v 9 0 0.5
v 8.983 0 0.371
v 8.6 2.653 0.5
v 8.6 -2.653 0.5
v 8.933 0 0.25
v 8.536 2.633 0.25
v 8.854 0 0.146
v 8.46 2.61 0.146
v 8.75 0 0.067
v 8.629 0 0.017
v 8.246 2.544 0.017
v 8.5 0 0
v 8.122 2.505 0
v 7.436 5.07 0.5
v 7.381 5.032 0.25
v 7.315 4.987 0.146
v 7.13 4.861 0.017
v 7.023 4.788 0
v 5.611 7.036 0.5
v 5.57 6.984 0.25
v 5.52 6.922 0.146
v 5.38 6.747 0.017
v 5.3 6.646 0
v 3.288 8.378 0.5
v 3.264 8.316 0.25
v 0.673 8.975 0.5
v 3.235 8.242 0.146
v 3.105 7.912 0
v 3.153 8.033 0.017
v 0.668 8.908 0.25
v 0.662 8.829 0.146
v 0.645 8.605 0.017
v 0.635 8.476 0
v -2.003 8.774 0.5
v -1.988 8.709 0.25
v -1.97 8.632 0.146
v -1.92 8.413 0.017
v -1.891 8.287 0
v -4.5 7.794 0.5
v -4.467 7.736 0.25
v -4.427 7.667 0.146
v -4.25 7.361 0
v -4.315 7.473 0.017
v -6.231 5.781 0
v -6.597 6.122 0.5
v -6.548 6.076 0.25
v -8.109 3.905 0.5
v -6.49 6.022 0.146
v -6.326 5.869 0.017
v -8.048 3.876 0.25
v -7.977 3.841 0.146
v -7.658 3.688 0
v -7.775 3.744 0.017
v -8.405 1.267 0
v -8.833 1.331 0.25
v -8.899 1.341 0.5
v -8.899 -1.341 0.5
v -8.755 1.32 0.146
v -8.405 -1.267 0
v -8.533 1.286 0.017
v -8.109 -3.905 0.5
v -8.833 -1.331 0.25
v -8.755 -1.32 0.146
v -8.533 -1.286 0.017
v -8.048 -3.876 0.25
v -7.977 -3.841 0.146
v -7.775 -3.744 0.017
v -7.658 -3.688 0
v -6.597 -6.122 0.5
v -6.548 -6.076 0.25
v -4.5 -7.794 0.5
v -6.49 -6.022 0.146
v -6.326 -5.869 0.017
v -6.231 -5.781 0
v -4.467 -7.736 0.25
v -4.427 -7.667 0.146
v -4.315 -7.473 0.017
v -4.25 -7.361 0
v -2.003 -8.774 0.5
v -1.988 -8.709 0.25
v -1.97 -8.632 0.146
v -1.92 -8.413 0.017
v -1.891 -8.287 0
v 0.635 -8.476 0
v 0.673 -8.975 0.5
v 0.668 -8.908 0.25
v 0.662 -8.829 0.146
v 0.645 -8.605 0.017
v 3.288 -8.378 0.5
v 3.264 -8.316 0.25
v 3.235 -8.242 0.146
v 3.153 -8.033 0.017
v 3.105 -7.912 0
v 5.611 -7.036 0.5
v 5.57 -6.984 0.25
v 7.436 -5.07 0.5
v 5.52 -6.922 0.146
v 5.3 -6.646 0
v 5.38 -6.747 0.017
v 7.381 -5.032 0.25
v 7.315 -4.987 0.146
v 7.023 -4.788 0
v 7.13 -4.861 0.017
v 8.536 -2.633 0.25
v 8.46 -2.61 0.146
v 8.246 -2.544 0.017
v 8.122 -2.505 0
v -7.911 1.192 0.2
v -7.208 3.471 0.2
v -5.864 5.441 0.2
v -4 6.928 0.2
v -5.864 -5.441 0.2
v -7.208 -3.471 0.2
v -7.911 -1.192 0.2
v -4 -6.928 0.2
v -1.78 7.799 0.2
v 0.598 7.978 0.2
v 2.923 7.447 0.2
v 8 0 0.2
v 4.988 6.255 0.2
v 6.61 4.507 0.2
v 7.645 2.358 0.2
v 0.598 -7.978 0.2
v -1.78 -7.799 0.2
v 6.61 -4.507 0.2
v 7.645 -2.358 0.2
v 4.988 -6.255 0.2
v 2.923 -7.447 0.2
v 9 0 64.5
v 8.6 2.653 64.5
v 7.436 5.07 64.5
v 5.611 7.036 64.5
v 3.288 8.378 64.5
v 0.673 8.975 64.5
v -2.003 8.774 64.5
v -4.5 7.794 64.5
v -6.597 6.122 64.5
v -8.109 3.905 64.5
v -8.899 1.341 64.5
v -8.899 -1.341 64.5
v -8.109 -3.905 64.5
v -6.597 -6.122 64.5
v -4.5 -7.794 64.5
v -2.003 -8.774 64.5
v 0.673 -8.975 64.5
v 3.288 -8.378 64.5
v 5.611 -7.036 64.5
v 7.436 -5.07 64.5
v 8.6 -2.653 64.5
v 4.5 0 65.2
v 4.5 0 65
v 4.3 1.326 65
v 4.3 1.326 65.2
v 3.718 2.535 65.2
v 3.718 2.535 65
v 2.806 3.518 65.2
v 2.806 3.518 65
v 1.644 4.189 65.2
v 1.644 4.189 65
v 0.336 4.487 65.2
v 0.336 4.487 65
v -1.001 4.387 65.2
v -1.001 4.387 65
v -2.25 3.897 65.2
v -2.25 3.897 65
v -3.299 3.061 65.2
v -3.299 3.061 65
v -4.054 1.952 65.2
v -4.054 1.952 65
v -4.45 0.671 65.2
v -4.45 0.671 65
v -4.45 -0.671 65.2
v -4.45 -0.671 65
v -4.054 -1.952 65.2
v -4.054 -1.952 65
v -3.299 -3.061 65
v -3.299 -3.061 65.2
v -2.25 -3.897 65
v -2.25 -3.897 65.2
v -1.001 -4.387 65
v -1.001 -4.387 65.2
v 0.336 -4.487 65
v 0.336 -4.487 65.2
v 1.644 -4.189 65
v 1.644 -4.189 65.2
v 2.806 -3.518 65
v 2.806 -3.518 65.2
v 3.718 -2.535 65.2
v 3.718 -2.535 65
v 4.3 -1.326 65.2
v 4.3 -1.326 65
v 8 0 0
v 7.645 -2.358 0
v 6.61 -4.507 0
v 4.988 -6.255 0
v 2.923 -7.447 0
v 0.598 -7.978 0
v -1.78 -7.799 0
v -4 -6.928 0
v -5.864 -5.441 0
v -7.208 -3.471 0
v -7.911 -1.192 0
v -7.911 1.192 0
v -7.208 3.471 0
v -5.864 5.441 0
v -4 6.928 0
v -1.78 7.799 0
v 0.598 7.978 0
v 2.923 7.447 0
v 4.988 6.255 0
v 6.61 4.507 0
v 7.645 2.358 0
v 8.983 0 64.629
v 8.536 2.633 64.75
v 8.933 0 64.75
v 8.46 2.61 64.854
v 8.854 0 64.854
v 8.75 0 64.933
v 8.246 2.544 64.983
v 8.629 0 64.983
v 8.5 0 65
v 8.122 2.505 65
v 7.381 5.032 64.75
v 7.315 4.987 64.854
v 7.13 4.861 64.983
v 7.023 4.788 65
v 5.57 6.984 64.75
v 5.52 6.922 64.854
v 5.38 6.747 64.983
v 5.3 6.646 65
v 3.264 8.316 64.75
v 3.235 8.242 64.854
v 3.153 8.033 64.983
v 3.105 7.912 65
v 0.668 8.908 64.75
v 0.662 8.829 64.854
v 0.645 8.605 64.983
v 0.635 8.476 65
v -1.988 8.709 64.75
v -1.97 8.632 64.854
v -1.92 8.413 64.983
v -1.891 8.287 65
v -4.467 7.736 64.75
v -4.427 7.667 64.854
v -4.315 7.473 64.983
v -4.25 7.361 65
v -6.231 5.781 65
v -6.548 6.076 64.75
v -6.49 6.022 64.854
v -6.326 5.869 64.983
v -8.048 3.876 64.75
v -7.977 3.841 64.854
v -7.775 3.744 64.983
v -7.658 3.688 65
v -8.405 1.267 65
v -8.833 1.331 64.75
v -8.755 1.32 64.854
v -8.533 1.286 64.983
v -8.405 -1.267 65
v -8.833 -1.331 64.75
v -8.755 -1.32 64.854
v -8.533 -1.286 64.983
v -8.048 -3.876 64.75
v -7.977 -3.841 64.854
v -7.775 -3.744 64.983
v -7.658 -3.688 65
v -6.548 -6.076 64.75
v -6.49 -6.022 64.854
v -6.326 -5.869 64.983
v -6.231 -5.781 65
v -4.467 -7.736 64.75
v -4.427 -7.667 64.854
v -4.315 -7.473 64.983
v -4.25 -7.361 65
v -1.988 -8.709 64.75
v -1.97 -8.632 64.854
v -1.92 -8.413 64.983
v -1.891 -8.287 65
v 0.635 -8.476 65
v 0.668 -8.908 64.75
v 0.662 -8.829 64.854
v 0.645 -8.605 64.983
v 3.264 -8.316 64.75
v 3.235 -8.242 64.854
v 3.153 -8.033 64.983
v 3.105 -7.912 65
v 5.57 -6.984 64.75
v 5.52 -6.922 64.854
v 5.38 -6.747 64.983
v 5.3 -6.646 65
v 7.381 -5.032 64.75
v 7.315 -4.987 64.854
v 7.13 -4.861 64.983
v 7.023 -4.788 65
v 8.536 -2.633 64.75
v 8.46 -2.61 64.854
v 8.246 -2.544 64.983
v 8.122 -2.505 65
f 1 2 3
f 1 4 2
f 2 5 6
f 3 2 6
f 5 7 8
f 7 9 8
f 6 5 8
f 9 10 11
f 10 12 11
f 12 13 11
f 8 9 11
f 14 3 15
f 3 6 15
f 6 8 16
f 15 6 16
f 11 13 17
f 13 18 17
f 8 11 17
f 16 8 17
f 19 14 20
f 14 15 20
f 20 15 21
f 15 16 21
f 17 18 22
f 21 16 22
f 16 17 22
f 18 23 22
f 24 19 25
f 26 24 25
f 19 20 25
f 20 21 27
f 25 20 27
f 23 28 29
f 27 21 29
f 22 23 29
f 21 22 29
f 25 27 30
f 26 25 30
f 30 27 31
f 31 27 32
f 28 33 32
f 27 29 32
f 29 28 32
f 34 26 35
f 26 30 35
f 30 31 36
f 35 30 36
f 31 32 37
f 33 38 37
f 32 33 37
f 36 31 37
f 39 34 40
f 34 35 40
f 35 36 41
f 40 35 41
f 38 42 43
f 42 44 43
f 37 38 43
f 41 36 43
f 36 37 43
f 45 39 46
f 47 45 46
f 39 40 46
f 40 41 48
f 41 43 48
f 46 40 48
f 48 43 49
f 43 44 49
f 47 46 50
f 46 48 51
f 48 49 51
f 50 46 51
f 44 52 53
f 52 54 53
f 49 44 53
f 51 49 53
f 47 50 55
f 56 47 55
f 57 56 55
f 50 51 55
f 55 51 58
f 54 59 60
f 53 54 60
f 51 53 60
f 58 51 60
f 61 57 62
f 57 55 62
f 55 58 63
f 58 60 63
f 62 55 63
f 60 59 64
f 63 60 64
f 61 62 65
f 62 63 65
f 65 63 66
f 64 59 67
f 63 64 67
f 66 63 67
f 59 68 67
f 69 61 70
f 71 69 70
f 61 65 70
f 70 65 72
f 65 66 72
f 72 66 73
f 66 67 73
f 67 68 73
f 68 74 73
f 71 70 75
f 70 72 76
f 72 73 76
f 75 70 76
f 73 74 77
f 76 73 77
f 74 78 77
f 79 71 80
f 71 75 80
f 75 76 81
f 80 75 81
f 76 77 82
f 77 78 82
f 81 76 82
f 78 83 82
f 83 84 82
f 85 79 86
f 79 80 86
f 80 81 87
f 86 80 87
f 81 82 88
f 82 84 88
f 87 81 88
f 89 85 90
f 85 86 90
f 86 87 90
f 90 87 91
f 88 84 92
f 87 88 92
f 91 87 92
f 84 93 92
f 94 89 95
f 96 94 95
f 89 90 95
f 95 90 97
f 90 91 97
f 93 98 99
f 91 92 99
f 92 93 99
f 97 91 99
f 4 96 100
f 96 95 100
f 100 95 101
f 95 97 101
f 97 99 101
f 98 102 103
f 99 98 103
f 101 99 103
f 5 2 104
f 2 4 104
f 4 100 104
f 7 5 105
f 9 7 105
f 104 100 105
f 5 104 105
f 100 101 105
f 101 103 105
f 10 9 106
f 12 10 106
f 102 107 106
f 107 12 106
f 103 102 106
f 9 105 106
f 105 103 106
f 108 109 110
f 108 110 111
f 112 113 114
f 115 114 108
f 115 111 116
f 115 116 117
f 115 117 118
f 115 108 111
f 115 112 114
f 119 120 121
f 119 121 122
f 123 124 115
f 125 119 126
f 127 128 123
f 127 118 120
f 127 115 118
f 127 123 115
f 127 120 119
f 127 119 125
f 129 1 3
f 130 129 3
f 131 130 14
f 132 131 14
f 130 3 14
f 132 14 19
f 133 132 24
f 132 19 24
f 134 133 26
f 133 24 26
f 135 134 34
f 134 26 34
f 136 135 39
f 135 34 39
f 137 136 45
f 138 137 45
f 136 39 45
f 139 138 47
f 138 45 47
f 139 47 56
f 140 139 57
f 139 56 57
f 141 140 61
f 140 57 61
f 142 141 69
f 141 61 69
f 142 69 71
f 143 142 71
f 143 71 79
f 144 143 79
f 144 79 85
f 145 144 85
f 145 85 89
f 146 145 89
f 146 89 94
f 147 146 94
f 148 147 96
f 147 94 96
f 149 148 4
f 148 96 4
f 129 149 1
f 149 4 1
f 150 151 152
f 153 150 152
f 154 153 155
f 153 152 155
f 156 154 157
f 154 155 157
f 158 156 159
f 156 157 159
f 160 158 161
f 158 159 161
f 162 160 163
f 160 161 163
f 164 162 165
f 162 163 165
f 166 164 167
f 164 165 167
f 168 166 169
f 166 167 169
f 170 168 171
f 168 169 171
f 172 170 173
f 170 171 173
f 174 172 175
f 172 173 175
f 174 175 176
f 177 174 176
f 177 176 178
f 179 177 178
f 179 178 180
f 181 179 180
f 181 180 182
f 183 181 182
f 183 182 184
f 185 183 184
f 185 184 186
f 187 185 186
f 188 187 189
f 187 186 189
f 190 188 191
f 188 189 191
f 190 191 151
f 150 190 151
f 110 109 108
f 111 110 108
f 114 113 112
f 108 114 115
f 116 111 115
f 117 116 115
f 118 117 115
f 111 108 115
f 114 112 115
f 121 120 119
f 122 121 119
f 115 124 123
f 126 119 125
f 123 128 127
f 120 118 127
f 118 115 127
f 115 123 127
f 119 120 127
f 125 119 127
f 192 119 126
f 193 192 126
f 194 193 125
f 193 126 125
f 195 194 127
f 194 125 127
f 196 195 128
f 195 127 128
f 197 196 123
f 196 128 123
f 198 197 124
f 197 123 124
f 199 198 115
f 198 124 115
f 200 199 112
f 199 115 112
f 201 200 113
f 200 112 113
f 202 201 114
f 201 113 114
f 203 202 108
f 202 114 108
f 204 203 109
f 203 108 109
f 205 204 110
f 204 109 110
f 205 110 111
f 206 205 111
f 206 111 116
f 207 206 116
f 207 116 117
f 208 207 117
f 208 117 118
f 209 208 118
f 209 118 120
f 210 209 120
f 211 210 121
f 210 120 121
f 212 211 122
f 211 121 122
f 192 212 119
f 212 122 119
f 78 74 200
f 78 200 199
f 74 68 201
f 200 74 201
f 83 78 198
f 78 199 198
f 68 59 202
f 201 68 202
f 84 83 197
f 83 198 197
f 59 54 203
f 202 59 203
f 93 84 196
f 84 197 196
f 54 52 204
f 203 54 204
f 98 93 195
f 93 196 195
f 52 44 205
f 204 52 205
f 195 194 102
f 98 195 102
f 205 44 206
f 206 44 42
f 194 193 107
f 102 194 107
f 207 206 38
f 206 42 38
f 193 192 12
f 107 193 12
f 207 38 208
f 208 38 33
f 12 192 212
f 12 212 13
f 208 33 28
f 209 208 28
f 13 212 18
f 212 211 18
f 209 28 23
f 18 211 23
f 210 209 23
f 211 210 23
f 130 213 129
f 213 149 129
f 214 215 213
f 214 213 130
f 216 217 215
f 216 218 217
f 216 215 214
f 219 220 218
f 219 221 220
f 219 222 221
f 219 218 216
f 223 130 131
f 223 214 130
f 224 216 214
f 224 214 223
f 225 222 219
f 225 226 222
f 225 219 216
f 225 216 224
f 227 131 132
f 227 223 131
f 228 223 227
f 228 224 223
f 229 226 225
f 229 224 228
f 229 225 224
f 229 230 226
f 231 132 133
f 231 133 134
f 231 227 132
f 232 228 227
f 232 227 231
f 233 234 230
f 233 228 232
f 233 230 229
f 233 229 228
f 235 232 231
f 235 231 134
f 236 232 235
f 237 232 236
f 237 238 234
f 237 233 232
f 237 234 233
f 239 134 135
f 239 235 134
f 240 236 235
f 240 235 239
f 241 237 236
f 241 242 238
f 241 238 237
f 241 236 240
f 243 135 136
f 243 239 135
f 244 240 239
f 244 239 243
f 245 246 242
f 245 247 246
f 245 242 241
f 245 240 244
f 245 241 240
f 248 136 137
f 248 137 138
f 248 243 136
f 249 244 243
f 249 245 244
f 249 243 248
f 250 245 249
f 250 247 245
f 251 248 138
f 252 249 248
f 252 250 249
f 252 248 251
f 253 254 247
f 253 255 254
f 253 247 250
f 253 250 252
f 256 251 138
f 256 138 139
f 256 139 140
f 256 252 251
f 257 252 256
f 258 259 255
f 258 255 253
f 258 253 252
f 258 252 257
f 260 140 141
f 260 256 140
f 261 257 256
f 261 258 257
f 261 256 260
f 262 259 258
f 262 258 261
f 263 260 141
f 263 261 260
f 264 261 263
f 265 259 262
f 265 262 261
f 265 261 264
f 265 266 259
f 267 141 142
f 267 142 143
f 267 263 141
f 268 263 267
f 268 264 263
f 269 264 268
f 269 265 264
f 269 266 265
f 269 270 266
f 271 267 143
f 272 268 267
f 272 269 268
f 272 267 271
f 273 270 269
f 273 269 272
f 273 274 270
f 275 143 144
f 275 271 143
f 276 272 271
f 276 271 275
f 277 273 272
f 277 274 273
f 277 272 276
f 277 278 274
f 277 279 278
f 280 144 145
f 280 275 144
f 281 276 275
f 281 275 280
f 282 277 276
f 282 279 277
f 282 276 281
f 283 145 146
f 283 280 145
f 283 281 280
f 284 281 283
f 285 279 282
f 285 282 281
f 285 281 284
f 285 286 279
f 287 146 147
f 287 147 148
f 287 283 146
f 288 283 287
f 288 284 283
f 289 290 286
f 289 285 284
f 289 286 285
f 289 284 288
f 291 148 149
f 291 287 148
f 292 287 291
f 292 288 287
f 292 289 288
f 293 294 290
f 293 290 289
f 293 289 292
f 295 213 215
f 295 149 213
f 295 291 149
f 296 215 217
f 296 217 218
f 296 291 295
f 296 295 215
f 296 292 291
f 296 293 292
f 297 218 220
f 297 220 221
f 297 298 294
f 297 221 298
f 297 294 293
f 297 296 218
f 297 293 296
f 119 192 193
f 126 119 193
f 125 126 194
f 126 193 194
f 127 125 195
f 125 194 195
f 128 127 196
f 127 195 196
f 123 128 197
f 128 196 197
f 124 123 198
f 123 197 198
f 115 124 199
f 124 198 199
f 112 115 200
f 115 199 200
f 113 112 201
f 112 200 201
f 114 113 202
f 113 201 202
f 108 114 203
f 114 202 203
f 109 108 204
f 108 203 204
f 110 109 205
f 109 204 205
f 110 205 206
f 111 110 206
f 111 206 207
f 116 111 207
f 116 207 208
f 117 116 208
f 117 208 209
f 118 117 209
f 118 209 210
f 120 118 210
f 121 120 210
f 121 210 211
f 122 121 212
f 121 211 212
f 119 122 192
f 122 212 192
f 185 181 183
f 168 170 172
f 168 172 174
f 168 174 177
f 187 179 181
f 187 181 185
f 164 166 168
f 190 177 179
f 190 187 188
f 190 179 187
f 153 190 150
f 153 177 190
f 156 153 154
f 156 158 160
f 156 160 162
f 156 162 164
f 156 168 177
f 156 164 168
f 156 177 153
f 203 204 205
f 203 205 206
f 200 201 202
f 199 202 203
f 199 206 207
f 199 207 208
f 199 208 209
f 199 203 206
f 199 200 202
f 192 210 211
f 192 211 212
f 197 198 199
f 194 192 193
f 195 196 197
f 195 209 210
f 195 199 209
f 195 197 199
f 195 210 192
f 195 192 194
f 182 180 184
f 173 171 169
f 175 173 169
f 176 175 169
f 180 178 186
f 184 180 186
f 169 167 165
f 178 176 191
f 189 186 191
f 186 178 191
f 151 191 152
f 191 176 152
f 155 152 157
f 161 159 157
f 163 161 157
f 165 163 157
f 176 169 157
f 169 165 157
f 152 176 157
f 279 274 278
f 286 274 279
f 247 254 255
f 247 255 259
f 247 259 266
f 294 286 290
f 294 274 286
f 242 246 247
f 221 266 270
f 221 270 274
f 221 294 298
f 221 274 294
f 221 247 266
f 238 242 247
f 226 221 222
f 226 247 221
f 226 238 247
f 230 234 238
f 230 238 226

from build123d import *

# Parameters (mm, degrees)
F0_R     = 9
F1_DEPTH = 65
F2_R     = 4.5
F3_DEPTH = 0.2
F4_R     = 8
F5_DEPTH = 0.2
F6_R     = 8
F7_DEPTH = 0.2
F8_R     = 0.5


with BuildPart() as f1:
    # F0 (on Top) → F1 (new body)
    with BuildSketch(Plane.XY):
        Circle(F0_R)
    extrude(amount=F1_DEPTH)

    # F4 (on face) → F5 (cut)
    with BuildSketch(Plane(origin=(0, 0, 0), x_dir=(1, 0, 0), z_dir=(0, 0, -1))):
        Circle(F4_R)
    extrude(amount=-F5_DEPTH, mode=Mode.SUBTRACT)

    # F8
    f8_edges = [f1.edges().sort_by_distance(p)[0] for p in [
        (-9, 0, 65),
        (-9, 0, 0),
    ]]
    fillet(f8_edges, radius=F8_R)


with BuildPart() as f3:
    # F2 (on face) → F3 (new body)
    with BuildSketch(Plane.XY.offset(65)):
        Circle(F2_R)
    extrude(amount=F3_DEPTH)


with BuildPart() as f7:
    # F6 (on face) → F7 (new body)
    with BuildSketch(Plane(origin=(0, 0, 0.2), x_dir=(1, 0, 0), z_dir=(0, 0, -1))):
        Circle(F6_R)
    extrude(amount=F7_DEPTH)


solid = Compound([f1.part, f3.part, f7.part])
